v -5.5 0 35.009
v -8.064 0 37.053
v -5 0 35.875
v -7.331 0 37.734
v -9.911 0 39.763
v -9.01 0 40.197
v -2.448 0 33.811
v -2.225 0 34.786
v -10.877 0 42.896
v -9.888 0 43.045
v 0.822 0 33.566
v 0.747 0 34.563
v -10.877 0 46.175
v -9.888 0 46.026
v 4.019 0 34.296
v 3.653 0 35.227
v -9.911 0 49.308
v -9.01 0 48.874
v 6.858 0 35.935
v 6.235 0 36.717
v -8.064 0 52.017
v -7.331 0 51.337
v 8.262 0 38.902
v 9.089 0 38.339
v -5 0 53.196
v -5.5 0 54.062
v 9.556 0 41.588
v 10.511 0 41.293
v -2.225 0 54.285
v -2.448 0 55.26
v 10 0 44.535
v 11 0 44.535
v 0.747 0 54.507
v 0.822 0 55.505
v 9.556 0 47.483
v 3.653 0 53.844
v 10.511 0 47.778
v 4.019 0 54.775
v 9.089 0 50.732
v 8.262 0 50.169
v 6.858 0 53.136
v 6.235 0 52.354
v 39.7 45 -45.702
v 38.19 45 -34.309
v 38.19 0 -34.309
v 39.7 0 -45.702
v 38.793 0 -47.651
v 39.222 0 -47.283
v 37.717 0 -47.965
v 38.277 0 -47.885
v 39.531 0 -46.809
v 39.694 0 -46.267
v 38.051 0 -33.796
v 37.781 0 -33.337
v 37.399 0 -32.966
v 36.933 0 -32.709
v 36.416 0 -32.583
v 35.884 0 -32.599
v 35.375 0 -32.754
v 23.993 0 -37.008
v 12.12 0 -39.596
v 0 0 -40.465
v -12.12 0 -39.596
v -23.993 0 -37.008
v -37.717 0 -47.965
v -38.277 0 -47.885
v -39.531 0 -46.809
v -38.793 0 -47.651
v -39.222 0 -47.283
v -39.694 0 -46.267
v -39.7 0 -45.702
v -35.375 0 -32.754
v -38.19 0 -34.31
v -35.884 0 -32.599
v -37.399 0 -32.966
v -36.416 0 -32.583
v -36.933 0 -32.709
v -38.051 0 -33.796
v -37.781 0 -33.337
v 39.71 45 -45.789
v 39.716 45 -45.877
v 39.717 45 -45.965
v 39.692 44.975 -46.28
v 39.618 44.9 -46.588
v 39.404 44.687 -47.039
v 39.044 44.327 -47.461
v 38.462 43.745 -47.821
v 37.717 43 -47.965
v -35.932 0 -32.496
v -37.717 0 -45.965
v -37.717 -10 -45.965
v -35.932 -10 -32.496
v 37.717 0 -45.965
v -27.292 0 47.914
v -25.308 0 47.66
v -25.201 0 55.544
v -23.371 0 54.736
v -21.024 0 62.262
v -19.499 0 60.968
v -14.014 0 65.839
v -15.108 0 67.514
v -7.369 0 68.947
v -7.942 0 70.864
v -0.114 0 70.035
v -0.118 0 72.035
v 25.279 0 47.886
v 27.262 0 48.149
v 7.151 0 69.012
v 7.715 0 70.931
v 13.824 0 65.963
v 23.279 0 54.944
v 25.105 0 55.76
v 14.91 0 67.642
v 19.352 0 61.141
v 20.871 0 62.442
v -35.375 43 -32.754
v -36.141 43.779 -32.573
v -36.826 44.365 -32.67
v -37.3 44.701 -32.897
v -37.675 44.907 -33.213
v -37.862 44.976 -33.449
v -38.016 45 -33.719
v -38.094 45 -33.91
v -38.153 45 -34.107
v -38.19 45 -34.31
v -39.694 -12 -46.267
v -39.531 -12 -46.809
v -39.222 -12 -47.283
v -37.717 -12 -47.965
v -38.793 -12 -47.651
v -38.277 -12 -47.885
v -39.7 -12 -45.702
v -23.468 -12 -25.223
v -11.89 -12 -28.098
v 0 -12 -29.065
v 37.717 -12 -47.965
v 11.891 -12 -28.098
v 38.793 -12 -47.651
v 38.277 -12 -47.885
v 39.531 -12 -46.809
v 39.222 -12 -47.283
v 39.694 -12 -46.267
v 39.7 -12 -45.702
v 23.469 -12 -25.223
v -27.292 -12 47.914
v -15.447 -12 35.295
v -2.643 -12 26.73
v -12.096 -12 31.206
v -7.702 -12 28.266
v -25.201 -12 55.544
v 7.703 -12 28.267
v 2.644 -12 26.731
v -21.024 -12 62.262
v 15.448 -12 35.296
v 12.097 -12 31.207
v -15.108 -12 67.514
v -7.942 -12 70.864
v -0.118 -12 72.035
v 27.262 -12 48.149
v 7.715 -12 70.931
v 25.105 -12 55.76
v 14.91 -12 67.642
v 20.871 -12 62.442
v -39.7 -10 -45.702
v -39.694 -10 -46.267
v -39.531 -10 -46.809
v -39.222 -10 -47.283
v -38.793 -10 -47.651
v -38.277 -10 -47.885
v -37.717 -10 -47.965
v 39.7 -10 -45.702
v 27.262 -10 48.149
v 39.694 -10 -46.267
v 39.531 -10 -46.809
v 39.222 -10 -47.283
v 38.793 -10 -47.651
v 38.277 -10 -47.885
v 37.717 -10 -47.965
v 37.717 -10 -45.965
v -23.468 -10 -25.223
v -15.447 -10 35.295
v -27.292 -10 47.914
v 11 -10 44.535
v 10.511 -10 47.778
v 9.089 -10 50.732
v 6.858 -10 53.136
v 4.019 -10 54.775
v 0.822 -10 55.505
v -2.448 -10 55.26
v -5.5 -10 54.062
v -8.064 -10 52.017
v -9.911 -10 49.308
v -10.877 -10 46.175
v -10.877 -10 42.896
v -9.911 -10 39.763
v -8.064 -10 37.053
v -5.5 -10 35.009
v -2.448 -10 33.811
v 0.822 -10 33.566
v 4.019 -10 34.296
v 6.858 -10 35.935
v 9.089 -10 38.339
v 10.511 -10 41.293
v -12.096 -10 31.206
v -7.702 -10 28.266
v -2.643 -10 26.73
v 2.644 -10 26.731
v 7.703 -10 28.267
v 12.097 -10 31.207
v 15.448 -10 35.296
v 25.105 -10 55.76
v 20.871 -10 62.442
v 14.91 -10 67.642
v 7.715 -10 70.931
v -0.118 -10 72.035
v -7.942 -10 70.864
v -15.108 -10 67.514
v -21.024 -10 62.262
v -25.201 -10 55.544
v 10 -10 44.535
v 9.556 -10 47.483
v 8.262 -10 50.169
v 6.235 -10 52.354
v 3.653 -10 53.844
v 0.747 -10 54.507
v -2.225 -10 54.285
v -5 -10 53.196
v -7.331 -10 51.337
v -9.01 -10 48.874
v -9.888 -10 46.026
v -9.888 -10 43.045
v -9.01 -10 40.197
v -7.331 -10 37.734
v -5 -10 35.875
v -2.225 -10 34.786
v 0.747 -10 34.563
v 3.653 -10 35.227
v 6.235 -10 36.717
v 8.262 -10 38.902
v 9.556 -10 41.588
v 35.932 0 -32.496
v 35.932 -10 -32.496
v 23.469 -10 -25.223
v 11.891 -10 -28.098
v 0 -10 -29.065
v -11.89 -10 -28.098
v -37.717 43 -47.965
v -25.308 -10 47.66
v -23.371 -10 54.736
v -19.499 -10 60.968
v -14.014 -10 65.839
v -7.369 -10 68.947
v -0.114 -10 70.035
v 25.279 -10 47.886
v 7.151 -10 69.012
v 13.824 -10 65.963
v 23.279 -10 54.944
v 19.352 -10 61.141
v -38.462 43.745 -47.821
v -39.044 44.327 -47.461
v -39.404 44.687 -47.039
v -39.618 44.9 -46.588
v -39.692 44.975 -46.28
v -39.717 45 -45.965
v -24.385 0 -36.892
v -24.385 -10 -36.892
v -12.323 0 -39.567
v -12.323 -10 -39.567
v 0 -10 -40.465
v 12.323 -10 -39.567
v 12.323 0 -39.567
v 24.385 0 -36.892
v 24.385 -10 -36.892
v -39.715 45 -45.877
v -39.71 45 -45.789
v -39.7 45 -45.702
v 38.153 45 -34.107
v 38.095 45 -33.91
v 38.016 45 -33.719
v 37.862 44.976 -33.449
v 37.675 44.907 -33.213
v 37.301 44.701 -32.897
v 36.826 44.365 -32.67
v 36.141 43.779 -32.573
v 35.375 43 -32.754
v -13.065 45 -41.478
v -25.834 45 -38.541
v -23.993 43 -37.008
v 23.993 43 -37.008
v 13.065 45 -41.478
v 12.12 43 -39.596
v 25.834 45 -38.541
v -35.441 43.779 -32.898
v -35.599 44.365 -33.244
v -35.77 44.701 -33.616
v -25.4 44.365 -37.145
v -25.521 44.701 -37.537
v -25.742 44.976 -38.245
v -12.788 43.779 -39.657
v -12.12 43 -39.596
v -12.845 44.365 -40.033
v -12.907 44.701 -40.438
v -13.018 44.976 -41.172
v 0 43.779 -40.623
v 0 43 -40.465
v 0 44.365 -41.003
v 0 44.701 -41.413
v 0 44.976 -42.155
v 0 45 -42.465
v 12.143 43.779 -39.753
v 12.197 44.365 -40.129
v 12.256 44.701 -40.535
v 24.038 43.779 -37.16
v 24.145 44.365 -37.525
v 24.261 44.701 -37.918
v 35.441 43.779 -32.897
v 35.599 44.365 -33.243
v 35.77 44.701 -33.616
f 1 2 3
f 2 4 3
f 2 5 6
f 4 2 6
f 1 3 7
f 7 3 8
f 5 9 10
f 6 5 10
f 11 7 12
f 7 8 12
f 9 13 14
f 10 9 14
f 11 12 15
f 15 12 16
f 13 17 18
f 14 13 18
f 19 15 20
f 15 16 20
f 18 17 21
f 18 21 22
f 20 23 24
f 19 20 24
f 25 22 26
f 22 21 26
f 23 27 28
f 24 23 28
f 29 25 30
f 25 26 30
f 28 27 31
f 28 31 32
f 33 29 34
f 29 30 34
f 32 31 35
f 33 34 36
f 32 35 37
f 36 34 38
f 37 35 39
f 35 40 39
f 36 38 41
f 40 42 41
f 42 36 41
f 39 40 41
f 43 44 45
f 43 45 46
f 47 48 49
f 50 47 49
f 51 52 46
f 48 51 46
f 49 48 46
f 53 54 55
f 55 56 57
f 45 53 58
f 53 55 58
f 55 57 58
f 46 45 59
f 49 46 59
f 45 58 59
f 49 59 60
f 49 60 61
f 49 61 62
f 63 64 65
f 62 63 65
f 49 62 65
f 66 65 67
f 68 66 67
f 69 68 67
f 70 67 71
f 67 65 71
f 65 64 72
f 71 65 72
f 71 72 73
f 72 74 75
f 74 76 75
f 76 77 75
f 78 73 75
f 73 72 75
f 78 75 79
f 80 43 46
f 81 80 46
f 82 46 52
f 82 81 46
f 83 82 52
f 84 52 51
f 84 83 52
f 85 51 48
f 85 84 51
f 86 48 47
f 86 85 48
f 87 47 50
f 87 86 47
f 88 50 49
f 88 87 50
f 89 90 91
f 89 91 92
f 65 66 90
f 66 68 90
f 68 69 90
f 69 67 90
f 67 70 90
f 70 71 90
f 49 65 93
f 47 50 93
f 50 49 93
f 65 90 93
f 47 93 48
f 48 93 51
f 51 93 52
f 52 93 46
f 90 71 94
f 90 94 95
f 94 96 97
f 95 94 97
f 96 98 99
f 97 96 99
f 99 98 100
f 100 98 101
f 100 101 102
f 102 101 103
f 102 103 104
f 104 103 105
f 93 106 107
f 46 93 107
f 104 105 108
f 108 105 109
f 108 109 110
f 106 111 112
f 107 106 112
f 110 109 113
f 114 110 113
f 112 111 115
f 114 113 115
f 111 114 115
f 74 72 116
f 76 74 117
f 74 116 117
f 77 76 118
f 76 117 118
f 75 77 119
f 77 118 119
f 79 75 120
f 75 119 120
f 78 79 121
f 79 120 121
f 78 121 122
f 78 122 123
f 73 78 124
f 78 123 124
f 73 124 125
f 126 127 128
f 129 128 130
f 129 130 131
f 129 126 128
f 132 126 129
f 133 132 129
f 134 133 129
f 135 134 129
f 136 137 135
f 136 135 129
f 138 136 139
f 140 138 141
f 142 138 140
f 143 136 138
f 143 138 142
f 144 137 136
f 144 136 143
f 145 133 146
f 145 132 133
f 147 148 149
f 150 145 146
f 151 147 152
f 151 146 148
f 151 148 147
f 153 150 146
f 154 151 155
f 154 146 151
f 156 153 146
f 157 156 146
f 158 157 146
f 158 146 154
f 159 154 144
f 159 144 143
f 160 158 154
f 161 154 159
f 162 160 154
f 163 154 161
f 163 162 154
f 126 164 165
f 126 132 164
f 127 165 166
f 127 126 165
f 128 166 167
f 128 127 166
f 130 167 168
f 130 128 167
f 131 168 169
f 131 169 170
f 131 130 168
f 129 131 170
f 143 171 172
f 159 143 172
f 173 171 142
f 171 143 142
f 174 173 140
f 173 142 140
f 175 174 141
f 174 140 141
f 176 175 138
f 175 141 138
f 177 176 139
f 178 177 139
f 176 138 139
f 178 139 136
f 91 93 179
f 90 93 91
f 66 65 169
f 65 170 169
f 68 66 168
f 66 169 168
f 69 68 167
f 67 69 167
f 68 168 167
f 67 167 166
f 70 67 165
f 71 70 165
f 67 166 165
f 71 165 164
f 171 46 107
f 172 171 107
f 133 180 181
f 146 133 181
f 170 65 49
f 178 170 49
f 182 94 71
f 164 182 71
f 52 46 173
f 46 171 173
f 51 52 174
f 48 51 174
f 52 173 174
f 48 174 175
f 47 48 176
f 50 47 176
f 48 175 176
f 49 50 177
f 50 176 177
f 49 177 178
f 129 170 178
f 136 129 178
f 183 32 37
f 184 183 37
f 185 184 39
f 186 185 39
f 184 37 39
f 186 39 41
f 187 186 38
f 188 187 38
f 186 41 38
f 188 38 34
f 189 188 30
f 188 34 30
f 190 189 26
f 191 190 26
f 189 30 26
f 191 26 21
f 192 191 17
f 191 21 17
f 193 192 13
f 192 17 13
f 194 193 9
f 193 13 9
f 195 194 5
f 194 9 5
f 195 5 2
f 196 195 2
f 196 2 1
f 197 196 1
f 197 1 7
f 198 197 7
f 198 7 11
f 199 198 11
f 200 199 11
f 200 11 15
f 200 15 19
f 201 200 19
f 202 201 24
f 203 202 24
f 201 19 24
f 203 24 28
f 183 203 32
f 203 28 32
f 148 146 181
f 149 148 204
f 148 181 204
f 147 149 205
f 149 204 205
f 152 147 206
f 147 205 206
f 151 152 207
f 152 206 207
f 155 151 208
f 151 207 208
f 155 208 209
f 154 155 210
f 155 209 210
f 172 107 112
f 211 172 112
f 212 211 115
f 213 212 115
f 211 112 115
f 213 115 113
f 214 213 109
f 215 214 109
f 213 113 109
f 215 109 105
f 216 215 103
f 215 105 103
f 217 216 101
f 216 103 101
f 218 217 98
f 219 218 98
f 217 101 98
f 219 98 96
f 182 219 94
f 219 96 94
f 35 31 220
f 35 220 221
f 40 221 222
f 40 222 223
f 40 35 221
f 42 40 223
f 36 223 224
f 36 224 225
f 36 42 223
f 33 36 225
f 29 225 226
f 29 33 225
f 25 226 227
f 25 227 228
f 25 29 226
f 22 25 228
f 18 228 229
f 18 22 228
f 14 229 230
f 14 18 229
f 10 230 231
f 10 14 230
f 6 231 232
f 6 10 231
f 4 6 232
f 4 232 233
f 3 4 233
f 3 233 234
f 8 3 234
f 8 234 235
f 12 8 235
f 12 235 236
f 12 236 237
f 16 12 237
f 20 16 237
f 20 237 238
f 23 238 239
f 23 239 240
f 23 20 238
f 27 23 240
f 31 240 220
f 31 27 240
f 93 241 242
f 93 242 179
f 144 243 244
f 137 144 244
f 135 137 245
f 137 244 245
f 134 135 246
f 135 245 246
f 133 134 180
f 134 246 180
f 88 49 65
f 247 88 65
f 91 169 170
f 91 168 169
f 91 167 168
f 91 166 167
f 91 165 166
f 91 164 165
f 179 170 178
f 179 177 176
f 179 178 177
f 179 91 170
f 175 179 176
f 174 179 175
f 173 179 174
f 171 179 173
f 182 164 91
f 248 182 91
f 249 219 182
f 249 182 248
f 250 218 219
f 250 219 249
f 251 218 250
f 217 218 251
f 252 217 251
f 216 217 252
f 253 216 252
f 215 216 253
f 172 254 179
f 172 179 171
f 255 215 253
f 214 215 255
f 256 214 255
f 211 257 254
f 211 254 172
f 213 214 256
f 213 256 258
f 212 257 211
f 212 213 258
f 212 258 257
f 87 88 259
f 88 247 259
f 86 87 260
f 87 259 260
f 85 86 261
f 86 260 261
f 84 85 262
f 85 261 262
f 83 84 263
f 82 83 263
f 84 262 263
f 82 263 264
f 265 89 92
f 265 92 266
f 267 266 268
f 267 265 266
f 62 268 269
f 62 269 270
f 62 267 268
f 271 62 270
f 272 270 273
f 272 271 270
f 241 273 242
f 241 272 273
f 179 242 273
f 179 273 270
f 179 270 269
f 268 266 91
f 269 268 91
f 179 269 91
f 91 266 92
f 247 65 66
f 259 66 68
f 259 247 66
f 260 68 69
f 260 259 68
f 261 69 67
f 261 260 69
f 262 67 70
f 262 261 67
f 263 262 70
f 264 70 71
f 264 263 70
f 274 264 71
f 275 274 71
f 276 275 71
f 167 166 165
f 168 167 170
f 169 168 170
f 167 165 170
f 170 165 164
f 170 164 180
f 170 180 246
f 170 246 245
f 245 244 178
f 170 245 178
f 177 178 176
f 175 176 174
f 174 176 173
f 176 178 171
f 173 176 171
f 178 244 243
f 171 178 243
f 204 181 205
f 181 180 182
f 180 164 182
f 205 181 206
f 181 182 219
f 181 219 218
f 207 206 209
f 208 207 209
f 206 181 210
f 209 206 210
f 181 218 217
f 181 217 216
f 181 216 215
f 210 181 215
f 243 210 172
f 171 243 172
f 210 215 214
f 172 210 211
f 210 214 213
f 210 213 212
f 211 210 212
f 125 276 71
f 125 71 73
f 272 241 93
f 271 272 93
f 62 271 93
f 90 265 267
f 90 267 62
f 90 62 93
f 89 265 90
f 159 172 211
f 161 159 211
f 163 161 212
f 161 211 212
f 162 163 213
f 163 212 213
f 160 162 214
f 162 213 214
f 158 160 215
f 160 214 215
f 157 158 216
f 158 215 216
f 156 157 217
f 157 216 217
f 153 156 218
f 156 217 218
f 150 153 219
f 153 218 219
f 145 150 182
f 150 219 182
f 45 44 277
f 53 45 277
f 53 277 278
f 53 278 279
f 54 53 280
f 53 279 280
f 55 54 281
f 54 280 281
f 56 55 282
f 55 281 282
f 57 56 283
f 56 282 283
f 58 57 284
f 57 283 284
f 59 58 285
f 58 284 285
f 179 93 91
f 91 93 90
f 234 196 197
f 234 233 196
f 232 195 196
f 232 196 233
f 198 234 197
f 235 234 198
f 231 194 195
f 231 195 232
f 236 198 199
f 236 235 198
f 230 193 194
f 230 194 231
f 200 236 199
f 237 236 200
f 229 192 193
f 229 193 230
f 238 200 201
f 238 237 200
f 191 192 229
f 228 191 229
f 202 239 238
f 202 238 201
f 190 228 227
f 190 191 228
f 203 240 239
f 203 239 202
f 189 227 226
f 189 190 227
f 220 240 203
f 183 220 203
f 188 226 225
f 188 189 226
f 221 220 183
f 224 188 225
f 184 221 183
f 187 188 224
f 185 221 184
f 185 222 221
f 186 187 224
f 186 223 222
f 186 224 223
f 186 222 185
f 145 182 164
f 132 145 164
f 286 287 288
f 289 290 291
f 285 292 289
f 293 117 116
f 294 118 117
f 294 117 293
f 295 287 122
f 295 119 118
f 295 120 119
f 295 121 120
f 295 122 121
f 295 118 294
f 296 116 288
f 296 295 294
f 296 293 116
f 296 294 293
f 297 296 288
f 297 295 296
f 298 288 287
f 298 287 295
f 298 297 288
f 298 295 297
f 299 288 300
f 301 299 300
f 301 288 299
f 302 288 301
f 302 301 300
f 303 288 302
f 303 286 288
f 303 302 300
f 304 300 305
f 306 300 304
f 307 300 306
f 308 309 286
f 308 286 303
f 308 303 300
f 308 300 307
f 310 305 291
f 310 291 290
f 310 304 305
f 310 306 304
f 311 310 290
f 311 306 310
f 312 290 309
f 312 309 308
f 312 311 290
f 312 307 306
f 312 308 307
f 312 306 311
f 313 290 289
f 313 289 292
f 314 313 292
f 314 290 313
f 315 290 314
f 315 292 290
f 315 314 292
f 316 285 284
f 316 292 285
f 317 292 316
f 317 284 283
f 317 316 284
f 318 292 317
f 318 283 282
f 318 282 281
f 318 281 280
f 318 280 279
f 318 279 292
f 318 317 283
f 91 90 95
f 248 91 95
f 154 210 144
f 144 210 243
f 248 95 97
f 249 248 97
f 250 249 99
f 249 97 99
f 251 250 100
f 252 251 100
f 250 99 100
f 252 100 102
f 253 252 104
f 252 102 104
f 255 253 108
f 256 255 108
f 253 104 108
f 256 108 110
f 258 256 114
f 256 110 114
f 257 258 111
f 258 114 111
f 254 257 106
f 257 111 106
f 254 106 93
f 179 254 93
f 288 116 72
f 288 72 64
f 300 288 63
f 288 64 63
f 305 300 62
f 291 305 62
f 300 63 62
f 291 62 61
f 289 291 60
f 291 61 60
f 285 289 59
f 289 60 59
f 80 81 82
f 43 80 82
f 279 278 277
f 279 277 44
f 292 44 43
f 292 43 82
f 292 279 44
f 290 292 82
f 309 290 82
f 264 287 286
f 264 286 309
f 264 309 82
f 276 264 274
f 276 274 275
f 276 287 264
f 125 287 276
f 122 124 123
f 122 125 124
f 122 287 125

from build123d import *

# Parameters (mm, degrees)
F0_R      = 11
F0_R_2    = 10
F1_DEPTH  = 10
F3_DEPTH  = 2
F5_DEPTH  = 10
F7_DEPTH  = 45
F8_R      = 2
F8_2_R    = 2
F8_3_R    = 2
F9_R      = 2
F11_DEPTH = 6


with BuildPart() as f1:
    # F0 (on Front) → F1 (new body)
    with BuildSketch(Plane.XZ):
        with BuildLine():
            Line((40, -47.964626), (27.261609, 48.148502))
            ThreePointArc((27.261609, 48.148502), (-0.118055, 72.03512), (-27.291625, 47.914307))
            Line((-27.291625, 47.914307), (-40, -47.964626))
            Line((-40, -47.964626), (40, -47.964626))
        make_face()
        with BuildLine():
            Line((-37.717416, -45.964626), (-25.307815, 47.660196))
            ThreePointArc((-25.307815, 47.660196), (-0.113686, 70.03512), (25.278946, 47.885729))
            Line((25.278946, 47.885729), (37.71744, -45.964626))
            Line((37.71744, -45.964626), (-37.717416, -45.964626))
        make_face(mode=Mode.SUBTRACT)
        with Locations((0, 44.535374)):
            Circle(F0_R)
        with Locations((0, 44.535374)):
            Circle(F0_R_2, mode=Mode.SUBTRACT)
    extrude(amount=F1_DEPTH)

    # F8#2
    f8_2_edges = [f1.edges().sort_by_distance(p)[0] for p in [
        (-40, -5, -47.964626),
        (40, -5, -47.964626),
    ]]
    fillet(f8_2_edges, radius=F8_2_R)


with BuildPart() as f3:
    # F2 (on face) → F3 (new body)
    with BuildSketch(Plane.XZ.offset(10)):
        with BuildLine():
            Line((40, -47.964626), (27.261609, 48.148502))
            ThreePointArc((27.261609, 48.148502), (-0.118055, 72.03512), (-27.291625, 47.914307))
            Line((-27.291625, 47.914307), (-40, -47.964626))
            Line((-40, -47.964626), (40, -47.964626))
        make_face()
    extrude(amount=F3_DEPTH)

    # F8#3
    f8_3_edges = [f3.edges().sort_by_distance(p)[0] for p in [
        (-40, -11, -47.964626),
        (40, -11, -47.964626),
    ]]
    fillet(f8_3_edges, radius=F8_3_R)

    # F10 (on face) → F11 (cut)
    with BuildSketch(Plane(origin=(0, -10, 0), x_dir=(-1, 0, 0), z_dir=(0, 1, 0))):
        with BuildLine():
            Line((-15.447832, 35.296083), (-23.468704, -25.222636))
            ThreePointArc((-23.468704, -25.222636), (-0.000132, -29.064626), (23.468454, -25.22272))
            Line((23.468454, -25.22272), (15.447089, 35.294842))
            ThreePointArc((15.447089, 35.294842), (-0.000723, 26.535374), (-15.447832, 35.296083))
        make_face()
    extrude(amount=-F11_DEPTH, mode=Mode.SUBTRACT)


with BuildPart() as f5:
    # F4 (on face) → F5 (new body, through all)
    with BuildSketch(Plane(origin=(0, 0, 0), x_dir=(-1, 0, 0), z_dir=(0, 1, 0))):
        with BuildLine():
            ThreePointArc((35.932238, -32.496271), (-8.7e-05, -40.464626), (-35.932396, -32.496197))
            Line((-35.932396, -32.496197), (-37.71744, -45.964626))
            Line((-37.71744, -45.964626), (37.717416, -45.964626))
            Line((37.717416, -45.964626), (35.932238, -32.496271))
        make_face()
    extrude(amount=-F5_DEPTH)


with BuildPart() as f7:
    # F6 (on face) → F7 (new body)
    with BuildSketch(Plane(origin=(0, 0, 0), x_dir=(-1, 0, 0), z_dir=(0, 1, 0))):
        with BuildLine():
            Line((-37.828831, -31.582821), (-40, -47.964626))
            Line((-40, -47.964626), (40, -47.964626))
            Line((40, -47.964626), (37.828667, -31.582903))
            ThreePointArc((37.828667, -31.582903), (-9.2e-05, -40.464626), (-37.828831, -31.582821))
        make_face()
    extrude(amount=F7_DEPTH)

    # F8
    f8_edges = [f7.edges().sort_by_distance(p)[0] for p in [
        (-40, 22.5, -47.964626),
        (0, 45, -47.964626),
        (40, 22.5, -47.964626),
    ]]
    fillet(f8_edges, radius=F8_R)

    # F9
    f9_edges = [f7.edges().sort_by_distance(p)[0] for p in [
        (9.2e-05, 45, -40.464626),
        (37.828831, 22.5, -31.582821),
        (-37.828667, 22.5, -31.582903),
    ]]
    fillet(f9_edges, radius=F9_R)


solid = Compound([f1.part, f3.part, f5.part, f7.part])
